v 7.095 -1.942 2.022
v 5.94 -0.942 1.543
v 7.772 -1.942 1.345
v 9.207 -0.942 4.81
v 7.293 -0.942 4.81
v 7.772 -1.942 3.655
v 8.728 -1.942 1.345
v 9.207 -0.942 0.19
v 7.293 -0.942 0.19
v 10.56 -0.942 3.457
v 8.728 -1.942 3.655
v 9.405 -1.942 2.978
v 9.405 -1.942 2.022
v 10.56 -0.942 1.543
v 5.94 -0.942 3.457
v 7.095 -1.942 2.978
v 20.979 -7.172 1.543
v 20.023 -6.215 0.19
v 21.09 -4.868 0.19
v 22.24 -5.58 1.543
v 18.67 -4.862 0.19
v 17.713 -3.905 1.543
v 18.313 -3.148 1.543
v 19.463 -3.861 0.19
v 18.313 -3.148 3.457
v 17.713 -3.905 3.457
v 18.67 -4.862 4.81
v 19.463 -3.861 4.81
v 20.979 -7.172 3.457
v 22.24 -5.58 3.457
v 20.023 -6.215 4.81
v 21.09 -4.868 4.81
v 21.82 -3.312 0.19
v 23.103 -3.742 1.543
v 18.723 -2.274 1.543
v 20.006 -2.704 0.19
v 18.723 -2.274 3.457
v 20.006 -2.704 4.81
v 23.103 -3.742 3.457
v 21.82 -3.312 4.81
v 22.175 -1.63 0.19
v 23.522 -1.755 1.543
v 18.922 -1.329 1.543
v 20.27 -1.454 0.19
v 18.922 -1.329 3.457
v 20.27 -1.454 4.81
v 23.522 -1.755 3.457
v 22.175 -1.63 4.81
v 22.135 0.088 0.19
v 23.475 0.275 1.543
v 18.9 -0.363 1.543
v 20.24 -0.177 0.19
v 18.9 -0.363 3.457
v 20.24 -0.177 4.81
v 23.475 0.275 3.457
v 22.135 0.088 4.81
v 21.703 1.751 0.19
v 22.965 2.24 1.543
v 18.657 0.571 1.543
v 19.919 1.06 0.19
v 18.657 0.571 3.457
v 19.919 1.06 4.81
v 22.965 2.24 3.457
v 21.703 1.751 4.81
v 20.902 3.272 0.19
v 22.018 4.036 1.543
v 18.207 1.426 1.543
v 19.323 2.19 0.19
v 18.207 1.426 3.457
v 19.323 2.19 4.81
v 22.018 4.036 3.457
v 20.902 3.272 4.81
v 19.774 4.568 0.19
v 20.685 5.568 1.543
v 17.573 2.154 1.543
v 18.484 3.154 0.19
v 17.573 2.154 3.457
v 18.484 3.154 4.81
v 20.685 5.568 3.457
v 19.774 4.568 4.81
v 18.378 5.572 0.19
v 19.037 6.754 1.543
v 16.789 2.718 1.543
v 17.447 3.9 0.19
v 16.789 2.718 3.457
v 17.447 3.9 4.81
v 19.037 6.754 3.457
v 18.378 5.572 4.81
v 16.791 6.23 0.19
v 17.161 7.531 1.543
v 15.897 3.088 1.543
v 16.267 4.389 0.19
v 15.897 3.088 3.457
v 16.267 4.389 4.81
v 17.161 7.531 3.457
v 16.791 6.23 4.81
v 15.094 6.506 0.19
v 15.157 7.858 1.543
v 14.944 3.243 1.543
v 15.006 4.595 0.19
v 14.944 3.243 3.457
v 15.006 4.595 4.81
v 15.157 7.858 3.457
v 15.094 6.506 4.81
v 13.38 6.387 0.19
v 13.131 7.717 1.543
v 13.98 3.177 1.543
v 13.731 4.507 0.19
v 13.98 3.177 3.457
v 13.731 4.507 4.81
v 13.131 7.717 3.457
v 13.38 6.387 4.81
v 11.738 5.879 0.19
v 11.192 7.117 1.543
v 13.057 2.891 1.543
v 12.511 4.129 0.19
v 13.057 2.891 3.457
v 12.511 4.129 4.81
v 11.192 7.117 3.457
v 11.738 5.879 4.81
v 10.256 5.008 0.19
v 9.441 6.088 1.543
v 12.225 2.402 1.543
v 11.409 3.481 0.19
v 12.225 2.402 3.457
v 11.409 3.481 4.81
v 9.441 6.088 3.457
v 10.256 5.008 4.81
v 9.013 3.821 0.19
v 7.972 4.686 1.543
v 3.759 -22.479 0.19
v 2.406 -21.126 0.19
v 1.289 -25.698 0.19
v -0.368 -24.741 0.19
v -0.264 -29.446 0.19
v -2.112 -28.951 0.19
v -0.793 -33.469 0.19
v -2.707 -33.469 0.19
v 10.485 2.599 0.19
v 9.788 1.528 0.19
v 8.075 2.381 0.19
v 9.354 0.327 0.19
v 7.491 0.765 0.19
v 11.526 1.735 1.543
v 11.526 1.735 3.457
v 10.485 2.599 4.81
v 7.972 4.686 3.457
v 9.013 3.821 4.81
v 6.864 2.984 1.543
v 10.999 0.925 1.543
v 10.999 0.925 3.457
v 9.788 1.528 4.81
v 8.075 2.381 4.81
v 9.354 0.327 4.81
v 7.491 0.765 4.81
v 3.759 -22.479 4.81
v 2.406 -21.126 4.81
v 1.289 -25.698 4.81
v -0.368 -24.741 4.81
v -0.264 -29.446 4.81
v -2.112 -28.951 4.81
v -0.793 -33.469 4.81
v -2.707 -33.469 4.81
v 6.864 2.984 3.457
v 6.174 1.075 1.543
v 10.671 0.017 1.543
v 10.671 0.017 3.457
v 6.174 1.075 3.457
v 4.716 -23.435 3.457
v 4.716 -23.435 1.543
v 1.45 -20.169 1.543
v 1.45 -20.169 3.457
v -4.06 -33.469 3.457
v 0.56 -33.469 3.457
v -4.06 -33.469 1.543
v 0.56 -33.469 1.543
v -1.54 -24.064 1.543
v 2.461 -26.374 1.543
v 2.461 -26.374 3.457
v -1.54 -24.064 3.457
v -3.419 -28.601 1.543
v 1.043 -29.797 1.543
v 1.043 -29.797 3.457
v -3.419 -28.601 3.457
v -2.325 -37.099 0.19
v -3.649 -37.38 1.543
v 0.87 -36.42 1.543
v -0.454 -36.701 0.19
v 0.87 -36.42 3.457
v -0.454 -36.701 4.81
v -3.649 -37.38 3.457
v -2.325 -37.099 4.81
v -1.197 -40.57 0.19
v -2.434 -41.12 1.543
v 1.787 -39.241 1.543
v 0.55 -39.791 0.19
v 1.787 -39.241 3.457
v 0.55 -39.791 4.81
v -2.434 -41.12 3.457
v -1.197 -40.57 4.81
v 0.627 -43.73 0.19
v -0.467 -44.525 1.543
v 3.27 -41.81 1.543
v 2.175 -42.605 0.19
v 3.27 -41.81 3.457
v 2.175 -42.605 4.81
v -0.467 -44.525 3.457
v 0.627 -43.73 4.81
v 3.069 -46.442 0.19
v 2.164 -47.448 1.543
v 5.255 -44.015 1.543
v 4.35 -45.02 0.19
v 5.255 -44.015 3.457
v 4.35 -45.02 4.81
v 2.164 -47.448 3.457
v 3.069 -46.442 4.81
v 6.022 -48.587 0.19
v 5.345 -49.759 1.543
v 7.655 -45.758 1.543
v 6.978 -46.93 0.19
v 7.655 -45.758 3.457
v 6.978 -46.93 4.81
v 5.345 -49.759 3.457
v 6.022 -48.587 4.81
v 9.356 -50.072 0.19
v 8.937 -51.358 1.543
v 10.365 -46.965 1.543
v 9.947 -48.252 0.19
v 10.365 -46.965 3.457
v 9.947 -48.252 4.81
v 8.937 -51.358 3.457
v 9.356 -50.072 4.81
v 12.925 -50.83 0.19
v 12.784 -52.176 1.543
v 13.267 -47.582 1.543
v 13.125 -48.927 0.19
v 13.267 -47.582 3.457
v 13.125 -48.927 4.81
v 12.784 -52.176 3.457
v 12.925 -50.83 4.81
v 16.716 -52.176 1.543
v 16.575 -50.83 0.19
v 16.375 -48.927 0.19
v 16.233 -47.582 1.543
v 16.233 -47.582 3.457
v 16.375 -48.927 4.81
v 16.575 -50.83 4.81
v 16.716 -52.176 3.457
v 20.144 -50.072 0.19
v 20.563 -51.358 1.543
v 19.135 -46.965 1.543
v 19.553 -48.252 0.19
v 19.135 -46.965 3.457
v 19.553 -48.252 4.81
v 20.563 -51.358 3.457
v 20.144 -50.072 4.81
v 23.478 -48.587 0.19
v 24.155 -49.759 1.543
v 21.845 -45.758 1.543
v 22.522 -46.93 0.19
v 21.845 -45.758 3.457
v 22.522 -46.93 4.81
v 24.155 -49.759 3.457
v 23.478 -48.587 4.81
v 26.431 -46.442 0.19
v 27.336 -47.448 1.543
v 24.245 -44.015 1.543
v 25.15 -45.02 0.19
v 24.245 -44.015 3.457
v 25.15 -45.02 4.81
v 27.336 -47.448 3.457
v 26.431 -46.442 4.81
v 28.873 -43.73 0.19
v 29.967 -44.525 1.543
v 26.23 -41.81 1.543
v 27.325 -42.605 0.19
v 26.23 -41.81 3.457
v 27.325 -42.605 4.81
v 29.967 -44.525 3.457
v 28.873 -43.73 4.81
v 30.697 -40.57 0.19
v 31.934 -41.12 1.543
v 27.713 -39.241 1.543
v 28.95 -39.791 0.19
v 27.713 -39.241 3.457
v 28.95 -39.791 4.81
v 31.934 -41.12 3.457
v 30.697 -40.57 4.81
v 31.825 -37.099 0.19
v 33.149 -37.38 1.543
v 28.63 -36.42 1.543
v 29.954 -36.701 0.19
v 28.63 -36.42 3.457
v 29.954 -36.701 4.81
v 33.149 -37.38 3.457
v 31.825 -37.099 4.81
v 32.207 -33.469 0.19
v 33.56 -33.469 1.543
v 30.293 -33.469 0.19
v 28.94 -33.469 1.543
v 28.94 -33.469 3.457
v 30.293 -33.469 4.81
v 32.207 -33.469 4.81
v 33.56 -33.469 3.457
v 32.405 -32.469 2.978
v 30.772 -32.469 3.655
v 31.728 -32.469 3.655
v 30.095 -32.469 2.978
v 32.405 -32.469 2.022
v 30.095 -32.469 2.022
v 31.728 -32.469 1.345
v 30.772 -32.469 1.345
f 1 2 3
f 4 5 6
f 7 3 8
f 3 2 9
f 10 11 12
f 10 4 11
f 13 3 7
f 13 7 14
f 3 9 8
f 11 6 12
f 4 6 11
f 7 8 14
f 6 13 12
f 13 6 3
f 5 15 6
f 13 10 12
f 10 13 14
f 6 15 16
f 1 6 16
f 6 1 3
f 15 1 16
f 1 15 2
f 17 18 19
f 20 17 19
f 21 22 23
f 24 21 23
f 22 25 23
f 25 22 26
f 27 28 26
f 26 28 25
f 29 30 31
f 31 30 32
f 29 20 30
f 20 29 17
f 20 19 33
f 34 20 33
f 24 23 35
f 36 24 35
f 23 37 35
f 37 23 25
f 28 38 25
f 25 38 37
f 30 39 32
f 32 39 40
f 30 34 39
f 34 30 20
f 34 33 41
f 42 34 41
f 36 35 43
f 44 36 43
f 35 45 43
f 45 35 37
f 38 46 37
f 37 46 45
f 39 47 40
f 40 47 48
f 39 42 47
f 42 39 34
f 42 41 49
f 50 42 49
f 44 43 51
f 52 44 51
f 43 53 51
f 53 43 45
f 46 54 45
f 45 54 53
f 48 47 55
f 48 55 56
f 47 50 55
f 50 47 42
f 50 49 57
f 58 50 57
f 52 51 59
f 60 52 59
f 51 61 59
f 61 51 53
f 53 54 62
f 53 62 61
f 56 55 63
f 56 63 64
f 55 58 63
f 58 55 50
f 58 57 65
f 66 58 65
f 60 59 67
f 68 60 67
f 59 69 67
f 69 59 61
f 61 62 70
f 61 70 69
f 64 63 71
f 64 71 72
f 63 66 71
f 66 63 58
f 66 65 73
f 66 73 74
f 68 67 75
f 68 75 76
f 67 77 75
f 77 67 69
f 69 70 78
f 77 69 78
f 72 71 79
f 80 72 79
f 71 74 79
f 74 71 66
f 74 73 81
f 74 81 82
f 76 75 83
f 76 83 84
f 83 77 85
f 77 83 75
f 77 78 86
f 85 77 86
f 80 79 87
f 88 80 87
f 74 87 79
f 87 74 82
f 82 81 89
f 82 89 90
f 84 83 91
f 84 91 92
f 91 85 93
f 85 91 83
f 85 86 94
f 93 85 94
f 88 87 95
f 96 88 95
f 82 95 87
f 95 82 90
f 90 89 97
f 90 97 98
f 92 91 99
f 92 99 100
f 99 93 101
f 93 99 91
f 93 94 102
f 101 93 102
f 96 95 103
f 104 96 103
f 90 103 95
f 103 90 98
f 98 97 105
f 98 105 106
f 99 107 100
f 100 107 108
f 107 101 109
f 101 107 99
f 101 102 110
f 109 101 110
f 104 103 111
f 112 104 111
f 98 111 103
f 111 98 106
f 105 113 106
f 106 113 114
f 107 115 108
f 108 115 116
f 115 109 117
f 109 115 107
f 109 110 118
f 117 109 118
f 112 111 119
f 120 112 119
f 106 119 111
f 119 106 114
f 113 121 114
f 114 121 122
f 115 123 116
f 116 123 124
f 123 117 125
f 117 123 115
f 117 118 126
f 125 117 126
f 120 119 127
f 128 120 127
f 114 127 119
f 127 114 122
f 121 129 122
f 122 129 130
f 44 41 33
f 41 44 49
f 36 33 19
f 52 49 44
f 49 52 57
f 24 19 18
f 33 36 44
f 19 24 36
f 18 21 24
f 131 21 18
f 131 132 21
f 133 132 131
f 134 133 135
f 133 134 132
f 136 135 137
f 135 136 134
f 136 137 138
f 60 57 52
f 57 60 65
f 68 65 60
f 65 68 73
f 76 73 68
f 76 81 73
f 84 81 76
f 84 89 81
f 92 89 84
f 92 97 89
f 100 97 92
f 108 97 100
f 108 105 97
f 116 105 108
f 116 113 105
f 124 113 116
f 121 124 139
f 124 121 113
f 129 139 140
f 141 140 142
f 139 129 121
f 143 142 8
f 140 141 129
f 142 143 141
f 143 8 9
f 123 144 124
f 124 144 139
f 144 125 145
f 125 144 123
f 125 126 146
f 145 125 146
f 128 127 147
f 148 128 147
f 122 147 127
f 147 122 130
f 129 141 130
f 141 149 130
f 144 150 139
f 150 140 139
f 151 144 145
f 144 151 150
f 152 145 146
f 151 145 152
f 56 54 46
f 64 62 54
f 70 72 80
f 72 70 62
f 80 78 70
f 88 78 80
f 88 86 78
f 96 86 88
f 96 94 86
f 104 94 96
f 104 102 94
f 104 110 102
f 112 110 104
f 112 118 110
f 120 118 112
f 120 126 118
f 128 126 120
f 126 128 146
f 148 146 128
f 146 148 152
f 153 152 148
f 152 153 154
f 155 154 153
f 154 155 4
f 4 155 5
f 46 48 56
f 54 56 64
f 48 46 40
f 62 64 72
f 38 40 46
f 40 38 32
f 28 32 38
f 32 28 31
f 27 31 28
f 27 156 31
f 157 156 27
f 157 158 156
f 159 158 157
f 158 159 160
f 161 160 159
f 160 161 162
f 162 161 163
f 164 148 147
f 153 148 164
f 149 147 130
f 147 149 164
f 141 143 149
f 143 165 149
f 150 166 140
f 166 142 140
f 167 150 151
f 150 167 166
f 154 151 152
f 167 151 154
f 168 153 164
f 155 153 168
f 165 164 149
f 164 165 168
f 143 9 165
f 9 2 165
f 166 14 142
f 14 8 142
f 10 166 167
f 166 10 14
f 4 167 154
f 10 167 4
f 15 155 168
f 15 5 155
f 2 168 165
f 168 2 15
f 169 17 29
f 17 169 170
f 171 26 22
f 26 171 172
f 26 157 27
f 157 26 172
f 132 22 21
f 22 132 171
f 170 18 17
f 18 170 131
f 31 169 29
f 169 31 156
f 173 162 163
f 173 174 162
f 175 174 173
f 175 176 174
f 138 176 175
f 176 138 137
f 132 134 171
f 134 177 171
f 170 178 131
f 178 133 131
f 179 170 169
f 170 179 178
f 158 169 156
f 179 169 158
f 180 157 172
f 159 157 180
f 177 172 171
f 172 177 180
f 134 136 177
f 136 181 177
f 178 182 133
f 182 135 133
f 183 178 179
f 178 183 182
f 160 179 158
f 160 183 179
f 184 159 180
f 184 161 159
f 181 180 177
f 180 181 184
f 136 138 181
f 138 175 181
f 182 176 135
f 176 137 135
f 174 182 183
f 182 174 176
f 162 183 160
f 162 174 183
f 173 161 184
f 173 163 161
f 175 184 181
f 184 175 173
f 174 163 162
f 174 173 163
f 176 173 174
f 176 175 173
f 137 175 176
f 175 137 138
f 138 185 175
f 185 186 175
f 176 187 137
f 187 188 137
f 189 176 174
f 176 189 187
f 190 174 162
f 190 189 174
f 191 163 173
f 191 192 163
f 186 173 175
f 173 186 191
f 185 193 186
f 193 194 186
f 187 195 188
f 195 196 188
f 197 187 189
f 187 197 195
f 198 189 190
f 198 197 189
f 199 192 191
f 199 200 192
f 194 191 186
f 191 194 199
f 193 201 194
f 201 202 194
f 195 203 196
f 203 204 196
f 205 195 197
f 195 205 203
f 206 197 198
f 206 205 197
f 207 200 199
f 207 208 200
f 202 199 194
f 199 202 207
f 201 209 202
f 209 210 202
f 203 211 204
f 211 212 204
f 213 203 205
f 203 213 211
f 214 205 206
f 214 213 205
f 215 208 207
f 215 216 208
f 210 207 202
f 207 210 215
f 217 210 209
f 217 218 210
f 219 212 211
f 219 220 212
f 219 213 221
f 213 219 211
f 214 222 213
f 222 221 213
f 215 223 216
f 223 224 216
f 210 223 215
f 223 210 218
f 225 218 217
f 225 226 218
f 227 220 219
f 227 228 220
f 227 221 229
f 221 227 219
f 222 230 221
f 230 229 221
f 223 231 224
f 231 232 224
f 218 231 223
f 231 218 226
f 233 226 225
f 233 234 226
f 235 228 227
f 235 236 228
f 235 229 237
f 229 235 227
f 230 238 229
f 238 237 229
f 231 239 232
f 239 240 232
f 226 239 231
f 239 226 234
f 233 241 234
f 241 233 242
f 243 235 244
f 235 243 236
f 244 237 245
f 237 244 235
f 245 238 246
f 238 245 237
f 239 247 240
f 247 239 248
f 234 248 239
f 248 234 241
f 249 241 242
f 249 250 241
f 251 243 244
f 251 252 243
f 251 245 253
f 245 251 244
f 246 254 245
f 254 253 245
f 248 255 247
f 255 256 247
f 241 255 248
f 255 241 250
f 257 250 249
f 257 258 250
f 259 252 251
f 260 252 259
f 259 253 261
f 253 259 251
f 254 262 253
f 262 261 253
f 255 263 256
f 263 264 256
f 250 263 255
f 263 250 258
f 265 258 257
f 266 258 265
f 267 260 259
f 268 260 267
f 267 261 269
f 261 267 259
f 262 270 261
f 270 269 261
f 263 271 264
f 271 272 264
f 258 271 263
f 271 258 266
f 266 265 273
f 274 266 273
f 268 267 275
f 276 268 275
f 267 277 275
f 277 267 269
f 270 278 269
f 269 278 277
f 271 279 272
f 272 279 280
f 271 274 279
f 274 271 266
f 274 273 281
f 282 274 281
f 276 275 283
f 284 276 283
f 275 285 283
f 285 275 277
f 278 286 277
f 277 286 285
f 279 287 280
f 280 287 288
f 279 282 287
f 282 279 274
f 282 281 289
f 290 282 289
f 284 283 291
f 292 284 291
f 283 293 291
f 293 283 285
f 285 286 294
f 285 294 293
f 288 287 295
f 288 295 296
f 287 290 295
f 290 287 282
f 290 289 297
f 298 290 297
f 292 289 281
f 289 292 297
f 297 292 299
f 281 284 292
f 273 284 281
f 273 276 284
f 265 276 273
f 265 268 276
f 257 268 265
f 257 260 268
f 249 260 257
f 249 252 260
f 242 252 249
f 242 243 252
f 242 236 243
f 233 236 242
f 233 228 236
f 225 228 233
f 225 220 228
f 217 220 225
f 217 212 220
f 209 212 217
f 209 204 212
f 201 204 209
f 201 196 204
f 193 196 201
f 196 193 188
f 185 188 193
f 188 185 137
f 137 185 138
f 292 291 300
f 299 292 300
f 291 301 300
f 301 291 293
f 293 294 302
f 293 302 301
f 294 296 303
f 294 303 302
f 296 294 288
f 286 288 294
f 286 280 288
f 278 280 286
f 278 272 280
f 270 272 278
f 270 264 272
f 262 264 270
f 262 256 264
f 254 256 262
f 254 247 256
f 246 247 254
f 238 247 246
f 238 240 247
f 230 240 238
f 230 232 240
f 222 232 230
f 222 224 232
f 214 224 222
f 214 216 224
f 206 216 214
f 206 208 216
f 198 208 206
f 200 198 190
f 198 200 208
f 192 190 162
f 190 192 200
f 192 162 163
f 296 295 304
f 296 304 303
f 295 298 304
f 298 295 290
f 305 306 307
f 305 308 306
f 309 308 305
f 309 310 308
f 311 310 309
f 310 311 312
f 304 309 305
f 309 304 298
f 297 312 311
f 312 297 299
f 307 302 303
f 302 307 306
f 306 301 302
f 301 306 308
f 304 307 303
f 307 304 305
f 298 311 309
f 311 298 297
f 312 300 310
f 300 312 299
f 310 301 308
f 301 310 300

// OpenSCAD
// Diameter of the "wire" you want to use for hook.
wire_width = 5;

// "Runded" end of wire length, use 0 for straight.
wire_cap_length = 1;

// Diameter of top hook. Note that this specifies diameter of pipe this hook should fit. Real diameter will be extended by wire width.
top_hook_inner_diameter = 8;

// Diameter of bottom hook. Note that this specifies diameter of pipe this hook should fit. Real diameter will be extended by wire width.
bottom_hook_inner_diameter= 28;

// Length of straight extension of bottom hook.
bottom_hook_length=0;


module simple_hook(w, d1, d2, l2, cl=1) {
    wire_radius = w/2;
    top_hook_radius = d1/2 + wire_radius;
    bottom_hook_radius = d2/2 + wire_radius;
    center_length = top_hook_radius + bottom_hook_radius;

    module wire_face() {
        rotate([0, 0, 22.5]) 
         circle(wire_radius, $fn=8);
    }

    module curved_wire(rad, angle) {
       rotate_extrude(angle=angle) 
        translate([rad, 0, 0]) 
        wire_face(); 
    }

    module straight_wire(length) {
        rotate([90, 0, 0]) 
         linear_extrude(length) 
         wire_face();
    }

    module wire_cap() {
        rotate([90, 0, 0]) 
         rotate([0, 0, 22.5]) 
         cylinder(h=cl, r1=wire_radius, r2=wire_radius/2, $fn=8);
    }

    module top_hook() {
        rotate([0, 0, 45])
         translate([-top_hook_radius, 0, 0])
         wire_cap();
        
        curved_wire(top_hook_radius, 225);
        
        translate([top_hook_radius, 0, 0])
         straight_wire(center_length);

        translate([center_length, -center_length, 0])
         rotate([0, 0, 180])
         curved_wire(bottom_hook_radius, 45);
    }

    module bottom_hook() {
        curved_wire(bottom_hook_radius, 180);
        
        translate([-bottom_hook_radius, 0, 0]) {
            straight_wire(l2*2/3);
            translate([0, -l2*2/3, 0]) wire_cap();
        }
        
        translate([bottom_hook_radius, 0, 0]) straight_wire(l2);
    }

    translate([top_hook_radius, 0 , 0]) 
     rotate([0, 0, -45])
     translate([2*top_hook_radius, -(top_hook_radius+center_length), wire_radius]) {
        translate([-top_hook_radius, center_length + sin(45)*bottom_hook_radius, 0])
         top_hook();

        translate([bottom_hook_radius - cos(45)*bottom_hook_radius, 0, 0])
         rotate([0, 0, 225])
         translate([-bottom_hook_radius, l2, 0])
         bottom_hook();
    }
}


simple_hook(wire_width, top_hook_inner_diameter, bottom_hook_inner_diameter, bottom_hook_length, wire_cap_length);
